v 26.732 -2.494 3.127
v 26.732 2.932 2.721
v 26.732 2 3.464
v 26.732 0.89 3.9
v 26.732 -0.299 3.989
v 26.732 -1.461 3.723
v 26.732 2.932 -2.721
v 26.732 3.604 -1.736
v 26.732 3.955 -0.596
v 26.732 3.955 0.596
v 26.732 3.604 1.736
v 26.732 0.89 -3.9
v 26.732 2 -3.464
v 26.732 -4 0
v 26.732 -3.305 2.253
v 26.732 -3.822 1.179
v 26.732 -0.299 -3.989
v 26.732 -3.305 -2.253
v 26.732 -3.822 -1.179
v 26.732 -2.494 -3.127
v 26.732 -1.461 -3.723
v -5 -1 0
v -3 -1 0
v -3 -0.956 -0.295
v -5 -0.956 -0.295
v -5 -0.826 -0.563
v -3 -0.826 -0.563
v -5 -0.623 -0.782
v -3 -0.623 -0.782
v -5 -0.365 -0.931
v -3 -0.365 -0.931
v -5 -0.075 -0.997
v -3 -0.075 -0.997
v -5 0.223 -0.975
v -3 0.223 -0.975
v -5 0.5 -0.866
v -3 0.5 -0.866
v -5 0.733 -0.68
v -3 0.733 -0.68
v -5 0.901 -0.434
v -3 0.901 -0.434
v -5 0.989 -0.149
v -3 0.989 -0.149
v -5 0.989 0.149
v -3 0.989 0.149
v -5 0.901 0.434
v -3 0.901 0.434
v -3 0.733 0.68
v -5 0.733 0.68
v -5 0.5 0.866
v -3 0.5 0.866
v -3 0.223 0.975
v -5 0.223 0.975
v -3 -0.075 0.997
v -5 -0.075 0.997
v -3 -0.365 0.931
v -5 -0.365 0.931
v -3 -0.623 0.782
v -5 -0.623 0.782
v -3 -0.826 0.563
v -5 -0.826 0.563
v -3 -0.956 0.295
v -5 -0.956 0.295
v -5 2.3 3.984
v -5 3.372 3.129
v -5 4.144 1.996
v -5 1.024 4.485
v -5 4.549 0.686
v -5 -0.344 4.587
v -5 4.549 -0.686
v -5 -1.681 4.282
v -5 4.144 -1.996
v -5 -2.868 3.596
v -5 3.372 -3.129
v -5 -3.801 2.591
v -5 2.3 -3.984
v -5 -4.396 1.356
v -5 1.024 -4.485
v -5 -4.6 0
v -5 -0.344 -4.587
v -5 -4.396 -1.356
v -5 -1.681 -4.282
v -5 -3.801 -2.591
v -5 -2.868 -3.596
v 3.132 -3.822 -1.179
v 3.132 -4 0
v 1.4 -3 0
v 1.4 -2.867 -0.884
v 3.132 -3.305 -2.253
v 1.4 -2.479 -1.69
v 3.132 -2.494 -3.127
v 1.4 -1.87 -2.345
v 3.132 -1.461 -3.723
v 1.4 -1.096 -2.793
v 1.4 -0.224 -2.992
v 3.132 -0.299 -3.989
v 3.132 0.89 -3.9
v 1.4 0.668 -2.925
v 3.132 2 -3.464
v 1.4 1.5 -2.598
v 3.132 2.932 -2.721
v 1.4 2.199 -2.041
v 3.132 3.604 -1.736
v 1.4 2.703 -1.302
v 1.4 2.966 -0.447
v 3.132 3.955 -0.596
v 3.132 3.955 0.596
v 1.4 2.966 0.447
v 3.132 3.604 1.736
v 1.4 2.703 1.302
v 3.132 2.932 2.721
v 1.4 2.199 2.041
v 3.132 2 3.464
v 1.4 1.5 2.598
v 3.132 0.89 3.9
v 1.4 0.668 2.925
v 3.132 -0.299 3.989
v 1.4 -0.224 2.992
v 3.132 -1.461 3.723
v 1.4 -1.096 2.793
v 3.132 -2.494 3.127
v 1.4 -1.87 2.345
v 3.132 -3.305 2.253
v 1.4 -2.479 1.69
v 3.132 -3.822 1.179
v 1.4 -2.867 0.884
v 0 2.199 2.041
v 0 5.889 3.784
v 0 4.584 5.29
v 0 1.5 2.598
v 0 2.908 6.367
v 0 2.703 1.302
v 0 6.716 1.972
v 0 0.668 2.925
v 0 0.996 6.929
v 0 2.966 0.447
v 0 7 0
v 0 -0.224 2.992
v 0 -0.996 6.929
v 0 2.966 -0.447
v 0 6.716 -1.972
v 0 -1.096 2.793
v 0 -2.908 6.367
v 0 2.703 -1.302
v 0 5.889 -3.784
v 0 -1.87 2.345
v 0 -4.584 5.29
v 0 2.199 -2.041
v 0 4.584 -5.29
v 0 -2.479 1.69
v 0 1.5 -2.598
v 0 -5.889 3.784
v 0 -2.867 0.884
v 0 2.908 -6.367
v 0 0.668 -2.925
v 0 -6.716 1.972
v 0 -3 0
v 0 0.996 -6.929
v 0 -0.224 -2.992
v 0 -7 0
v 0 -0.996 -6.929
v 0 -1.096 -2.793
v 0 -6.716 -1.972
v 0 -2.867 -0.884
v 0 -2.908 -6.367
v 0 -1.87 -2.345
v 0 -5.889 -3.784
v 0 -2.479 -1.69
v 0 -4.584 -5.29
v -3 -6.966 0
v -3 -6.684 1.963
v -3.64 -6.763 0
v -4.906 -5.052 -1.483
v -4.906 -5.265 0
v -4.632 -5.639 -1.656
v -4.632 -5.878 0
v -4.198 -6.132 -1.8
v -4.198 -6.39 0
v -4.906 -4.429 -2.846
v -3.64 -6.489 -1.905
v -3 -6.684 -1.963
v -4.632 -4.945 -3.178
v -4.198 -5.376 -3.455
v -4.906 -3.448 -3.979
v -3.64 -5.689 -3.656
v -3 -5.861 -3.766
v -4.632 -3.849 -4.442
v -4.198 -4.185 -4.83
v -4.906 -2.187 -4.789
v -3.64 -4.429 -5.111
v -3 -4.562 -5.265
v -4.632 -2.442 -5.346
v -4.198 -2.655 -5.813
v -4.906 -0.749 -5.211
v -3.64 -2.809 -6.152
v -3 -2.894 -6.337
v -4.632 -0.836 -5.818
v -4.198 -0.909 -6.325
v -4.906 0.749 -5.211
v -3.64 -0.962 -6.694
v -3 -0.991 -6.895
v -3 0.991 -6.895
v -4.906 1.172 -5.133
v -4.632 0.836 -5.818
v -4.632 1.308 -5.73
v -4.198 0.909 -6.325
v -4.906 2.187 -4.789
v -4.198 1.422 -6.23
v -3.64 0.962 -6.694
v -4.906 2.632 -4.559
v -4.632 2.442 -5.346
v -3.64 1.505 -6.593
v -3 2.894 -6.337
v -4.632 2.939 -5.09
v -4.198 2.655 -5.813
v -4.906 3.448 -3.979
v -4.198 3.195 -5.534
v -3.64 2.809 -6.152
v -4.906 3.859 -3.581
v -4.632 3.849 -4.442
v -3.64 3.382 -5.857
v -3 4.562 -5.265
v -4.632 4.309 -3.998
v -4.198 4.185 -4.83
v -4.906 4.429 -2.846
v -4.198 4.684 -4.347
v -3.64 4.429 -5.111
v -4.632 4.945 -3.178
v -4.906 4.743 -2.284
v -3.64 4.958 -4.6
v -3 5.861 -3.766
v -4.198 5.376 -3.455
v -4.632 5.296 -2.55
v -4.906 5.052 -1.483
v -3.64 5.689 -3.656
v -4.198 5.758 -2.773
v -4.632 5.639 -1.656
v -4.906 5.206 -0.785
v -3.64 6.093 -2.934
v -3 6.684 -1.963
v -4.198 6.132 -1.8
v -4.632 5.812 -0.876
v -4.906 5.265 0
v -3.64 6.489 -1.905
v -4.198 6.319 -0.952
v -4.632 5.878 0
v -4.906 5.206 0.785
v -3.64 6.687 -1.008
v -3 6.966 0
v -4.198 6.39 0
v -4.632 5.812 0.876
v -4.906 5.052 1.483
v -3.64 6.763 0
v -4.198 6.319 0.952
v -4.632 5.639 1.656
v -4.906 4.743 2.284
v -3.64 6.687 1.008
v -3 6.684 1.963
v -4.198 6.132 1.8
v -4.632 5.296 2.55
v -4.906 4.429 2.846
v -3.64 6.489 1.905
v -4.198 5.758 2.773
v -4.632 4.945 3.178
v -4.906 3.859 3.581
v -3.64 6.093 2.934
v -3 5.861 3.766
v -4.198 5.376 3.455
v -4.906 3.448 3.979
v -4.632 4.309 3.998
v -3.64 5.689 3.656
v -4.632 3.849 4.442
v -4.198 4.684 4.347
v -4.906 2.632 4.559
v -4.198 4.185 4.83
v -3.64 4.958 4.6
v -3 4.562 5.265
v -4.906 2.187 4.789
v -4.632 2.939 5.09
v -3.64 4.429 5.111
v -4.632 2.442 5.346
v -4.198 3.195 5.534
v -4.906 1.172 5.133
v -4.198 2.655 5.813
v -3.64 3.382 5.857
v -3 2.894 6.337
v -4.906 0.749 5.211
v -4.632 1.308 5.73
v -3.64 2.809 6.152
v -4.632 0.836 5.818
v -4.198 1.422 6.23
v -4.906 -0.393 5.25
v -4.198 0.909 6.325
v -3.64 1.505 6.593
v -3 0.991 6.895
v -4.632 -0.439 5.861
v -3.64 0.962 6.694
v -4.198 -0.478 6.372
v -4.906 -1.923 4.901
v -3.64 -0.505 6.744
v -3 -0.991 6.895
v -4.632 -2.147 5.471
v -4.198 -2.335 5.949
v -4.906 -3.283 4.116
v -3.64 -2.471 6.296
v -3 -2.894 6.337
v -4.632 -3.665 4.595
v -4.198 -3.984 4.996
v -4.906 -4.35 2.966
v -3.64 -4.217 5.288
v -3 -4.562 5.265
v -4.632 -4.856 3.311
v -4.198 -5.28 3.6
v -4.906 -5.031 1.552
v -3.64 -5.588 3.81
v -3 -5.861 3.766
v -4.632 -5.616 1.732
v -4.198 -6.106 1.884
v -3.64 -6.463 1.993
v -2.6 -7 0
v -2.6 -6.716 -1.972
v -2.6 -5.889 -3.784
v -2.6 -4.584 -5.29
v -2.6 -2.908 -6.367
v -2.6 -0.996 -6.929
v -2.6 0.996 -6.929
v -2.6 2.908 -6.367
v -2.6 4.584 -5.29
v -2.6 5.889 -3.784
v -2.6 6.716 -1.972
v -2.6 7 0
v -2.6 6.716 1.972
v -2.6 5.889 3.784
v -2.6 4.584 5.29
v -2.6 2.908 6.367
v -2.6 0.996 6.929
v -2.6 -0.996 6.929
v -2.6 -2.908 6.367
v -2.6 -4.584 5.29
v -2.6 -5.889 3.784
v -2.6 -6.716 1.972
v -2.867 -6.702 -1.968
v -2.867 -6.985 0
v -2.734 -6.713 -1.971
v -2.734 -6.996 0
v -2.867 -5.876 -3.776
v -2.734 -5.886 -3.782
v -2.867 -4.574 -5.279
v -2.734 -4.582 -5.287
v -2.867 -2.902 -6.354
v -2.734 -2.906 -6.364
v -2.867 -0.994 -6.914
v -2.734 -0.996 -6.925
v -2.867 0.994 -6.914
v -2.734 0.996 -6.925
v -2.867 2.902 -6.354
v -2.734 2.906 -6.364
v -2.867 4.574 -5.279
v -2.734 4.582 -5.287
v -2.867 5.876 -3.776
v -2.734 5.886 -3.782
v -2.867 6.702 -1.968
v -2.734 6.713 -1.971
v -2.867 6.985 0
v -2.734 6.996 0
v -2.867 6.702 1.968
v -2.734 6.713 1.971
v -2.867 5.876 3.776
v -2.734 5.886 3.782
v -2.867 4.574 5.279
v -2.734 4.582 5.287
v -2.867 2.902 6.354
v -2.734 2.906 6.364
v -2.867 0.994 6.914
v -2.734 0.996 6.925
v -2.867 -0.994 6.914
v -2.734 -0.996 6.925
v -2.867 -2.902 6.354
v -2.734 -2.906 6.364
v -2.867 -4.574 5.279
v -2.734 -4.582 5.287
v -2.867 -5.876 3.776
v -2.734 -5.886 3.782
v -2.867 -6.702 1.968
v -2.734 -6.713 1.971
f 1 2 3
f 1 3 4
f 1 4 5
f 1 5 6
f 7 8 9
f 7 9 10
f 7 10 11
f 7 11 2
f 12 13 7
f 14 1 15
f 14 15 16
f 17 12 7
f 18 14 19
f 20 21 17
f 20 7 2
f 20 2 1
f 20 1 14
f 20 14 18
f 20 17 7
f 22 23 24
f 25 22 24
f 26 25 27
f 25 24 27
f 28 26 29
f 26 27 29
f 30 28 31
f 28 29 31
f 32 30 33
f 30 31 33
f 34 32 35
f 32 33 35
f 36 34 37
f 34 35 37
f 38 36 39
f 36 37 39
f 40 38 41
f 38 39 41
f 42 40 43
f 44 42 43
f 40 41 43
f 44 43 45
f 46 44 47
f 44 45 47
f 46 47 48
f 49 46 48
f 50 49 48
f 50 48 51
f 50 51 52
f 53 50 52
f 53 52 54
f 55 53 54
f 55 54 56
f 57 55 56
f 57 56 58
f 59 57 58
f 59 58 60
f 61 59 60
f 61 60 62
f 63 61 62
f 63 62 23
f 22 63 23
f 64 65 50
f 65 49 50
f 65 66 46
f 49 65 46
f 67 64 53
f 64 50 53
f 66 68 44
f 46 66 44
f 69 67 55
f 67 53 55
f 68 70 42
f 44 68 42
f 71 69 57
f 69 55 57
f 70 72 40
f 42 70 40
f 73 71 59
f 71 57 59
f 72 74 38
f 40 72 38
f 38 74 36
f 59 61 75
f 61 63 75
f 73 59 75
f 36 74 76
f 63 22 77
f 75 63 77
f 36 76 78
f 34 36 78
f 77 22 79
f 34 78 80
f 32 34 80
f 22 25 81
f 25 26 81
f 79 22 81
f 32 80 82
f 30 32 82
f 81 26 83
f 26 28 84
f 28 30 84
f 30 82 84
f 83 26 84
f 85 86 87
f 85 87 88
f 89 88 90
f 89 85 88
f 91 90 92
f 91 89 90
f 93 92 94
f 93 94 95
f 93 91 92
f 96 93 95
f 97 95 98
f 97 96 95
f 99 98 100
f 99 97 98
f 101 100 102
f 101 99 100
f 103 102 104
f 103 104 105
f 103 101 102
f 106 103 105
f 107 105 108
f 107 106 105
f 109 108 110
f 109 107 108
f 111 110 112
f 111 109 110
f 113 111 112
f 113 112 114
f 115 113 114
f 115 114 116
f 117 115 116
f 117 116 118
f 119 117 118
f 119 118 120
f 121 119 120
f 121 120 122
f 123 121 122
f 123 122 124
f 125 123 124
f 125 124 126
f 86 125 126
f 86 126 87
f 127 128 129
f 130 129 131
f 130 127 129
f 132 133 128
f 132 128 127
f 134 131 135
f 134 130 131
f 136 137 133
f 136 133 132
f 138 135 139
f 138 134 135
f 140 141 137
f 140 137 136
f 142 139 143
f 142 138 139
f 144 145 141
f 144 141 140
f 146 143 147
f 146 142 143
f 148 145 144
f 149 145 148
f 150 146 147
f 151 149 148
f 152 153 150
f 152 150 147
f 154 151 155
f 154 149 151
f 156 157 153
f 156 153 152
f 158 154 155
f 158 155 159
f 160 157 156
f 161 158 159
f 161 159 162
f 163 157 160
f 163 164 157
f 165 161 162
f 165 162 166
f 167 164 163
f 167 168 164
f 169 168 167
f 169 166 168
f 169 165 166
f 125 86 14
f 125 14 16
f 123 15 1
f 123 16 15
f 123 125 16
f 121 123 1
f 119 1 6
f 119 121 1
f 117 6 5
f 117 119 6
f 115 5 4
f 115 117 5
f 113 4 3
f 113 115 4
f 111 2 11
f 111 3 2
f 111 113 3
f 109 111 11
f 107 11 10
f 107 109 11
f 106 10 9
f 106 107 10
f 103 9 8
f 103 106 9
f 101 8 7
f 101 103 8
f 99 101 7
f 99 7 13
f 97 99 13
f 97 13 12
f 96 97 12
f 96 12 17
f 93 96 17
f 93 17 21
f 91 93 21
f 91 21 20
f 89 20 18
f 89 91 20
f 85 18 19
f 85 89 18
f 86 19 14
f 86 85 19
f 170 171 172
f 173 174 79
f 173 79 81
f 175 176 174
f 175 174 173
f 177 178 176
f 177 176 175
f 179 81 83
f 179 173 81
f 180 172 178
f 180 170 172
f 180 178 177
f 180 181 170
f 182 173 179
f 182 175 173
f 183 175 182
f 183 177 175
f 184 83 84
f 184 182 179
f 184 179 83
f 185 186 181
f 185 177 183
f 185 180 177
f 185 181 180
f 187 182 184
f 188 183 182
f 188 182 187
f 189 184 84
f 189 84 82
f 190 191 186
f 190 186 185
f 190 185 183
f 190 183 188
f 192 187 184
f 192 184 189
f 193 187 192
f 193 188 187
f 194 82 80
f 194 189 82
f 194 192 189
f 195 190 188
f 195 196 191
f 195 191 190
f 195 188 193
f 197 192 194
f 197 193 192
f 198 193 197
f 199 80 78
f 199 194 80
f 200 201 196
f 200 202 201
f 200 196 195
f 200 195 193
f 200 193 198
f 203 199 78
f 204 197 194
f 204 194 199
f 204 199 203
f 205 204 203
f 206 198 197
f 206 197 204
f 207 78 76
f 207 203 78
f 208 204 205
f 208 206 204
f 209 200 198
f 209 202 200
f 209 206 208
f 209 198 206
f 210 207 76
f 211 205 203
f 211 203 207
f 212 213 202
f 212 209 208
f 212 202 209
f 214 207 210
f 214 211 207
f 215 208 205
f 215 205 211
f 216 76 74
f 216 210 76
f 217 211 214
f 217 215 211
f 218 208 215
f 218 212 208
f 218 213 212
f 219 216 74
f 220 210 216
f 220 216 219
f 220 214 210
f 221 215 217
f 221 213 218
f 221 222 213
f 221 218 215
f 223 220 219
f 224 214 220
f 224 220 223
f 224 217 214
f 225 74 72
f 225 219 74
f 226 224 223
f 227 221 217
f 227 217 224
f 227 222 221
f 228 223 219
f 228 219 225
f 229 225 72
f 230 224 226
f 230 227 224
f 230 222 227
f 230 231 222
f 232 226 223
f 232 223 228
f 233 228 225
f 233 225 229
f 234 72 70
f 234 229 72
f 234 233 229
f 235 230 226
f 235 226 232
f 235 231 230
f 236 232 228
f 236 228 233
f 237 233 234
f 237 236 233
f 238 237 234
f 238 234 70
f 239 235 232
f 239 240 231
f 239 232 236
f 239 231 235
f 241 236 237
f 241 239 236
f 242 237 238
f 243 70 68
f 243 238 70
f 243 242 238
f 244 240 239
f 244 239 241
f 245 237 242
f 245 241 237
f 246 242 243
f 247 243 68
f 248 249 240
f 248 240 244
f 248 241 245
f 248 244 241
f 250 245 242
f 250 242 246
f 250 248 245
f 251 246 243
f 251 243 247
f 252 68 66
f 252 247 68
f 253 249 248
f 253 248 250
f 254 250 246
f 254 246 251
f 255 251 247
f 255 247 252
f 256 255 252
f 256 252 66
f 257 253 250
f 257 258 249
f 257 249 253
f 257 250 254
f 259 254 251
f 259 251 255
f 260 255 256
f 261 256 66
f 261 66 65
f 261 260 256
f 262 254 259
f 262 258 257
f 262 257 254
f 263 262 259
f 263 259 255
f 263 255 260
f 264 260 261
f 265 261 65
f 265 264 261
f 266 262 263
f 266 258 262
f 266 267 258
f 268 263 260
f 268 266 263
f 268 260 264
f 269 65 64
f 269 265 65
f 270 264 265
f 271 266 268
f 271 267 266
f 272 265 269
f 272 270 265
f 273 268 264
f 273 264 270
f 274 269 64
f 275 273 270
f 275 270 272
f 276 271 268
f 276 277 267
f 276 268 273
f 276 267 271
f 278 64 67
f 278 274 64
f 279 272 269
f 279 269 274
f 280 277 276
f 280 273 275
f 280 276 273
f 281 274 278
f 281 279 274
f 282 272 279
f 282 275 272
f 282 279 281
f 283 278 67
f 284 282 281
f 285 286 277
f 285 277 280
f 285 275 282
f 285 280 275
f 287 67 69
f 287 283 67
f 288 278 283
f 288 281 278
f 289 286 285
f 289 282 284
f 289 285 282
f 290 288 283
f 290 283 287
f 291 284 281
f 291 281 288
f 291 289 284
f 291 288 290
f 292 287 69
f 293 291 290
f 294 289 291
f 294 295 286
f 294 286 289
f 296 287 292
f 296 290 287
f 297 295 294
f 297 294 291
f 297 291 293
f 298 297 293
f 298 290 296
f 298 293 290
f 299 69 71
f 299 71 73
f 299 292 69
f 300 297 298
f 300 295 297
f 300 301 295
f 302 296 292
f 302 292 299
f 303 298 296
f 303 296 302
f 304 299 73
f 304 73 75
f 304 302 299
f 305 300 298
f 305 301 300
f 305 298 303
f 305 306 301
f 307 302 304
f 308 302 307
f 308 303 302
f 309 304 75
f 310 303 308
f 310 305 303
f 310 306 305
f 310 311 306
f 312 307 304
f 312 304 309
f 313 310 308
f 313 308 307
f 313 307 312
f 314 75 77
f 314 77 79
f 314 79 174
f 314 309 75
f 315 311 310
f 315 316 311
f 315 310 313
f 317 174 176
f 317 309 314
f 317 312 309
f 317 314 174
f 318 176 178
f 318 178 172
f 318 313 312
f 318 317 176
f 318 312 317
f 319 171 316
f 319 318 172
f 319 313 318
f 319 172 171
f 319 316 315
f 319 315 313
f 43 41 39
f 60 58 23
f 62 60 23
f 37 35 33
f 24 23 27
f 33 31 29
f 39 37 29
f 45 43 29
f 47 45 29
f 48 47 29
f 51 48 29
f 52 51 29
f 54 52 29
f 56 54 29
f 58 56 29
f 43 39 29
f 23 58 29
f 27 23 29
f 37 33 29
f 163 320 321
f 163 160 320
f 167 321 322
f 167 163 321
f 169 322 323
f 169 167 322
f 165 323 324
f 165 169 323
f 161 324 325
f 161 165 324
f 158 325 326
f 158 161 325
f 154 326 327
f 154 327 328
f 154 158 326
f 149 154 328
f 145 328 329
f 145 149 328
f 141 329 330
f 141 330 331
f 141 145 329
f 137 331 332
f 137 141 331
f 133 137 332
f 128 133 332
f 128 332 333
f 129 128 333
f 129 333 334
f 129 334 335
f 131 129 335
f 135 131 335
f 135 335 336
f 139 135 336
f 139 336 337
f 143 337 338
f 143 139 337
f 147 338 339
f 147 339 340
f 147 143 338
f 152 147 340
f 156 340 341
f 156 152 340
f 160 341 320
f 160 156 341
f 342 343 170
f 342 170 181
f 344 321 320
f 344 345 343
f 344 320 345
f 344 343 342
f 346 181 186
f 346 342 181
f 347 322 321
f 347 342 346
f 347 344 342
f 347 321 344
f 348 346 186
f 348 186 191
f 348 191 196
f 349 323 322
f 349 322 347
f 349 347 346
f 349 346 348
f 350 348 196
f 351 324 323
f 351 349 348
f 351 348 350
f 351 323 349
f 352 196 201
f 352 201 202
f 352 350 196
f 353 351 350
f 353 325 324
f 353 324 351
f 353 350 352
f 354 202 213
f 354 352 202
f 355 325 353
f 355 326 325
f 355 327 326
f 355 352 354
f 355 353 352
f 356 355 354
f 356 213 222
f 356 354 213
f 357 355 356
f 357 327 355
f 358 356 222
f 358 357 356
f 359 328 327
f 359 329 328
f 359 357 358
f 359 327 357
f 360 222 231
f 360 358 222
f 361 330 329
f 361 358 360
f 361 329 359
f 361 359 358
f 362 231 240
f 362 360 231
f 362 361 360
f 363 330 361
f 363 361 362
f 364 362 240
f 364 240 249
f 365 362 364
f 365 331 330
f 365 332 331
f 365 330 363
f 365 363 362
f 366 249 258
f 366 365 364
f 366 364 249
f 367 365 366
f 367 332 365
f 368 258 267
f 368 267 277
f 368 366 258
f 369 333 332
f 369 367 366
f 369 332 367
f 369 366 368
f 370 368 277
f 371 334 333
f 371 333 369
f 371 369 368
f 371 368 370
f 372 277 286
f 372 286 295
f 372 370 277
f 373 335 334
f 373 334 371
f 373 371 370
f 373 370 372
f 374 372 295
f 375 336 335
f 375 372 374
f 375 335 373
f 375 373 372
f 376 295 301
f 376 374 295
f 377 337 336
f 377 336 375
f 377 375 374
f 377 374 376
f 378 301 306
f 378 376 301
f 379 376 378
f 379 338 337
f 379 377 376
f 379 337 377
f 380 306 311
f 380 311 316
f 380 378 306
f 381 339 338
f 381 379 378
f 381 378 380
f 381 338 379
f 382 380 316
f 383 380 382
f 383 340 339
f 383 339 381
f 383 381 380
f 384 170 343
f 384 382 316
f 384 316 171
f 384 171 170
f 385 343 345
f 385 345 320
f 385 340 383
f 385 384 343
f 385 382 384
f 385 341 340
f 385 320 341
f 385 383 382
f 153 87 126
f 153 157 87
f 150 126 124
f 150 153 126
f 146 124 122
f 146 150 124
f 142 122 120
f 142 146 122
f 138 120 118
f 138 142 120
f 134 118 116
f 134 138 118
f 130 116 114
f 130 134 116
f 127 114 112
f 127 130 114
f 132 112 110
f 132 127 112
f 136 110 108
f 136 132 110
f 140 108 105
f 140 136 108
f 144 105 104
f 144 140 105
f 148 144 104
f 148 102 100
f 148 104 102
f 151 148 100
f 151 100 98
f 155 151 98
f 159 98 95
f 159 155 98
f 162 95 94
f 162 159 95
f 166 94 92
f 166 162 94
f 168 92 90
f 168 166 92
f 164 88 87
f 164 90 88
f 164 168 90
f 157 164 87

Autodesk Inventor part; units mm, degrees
ref_plane "YZ Plane" through (0, 0, 0) normal (1, 0, 0) x (0, 1, 0)
ref_plane "XZ Plane" through (0, 0, 0) normal (0, 1, 0) x (-1, 0, 0)
ref_plane "XY Plane" through (0, 0, 0) normal (0, 0, 1) x (1, 0, 0)
sketch "草图1" plane through (0, 0, 0) normal (0, 0, 1) x (1, 0, 0)
  line L0 (0, 0) -> (1.4, 0)
  line L1 (1.4, -3) -> (0, -3)
  line L2 (0, 0) -> (-3, 0)
  line L3 (-3, -7) -> (0, -7)
  line L4 (0, -7) -> (0, -3)
  line L5 (-5, -4.6) -> (-5, -1)
  line L6 (-5, -1) -> (-3, -1)
  line L7 (-3, -6.9664) -> (-3, -7)
  arc A0 (-5, -4.6) -> (-2.6, -7) centre (-2.6, -4.6) ccw
  line L8 (1.4, -3) -> (3.1321, -4)
  line L9 (-3, 0) -> (-3, -1)
  line L10 (-3, -6.9664) -> (-3, -7)
  line L11 (1.4, 0) -> (26.7321, 0)
  line L12 (26.7321, 0) -> (26.7321, -4)
  line L13 (26.7321, -4) -> (3.1321, -4)
  dimension "d0" = 1.4
  dimension "d1" = 3
  dimension "d2" = 3
  dimension "d4" = 2
  dimension "d6" = 4.8
  dimension "d7" = 30
  dimension "d9" = 23.6
  dimension "d10" = 4
revolve "旋转1" add sketch "草图1" angle 360 about axis through (1.4, 0, 0) along (1, 0, 0) contours L0 L11 L12 L13 L8 L1 L4 L3 A0 L5 L6 L9 L2
properties part number "13-螺钉" material "不锈钢"
